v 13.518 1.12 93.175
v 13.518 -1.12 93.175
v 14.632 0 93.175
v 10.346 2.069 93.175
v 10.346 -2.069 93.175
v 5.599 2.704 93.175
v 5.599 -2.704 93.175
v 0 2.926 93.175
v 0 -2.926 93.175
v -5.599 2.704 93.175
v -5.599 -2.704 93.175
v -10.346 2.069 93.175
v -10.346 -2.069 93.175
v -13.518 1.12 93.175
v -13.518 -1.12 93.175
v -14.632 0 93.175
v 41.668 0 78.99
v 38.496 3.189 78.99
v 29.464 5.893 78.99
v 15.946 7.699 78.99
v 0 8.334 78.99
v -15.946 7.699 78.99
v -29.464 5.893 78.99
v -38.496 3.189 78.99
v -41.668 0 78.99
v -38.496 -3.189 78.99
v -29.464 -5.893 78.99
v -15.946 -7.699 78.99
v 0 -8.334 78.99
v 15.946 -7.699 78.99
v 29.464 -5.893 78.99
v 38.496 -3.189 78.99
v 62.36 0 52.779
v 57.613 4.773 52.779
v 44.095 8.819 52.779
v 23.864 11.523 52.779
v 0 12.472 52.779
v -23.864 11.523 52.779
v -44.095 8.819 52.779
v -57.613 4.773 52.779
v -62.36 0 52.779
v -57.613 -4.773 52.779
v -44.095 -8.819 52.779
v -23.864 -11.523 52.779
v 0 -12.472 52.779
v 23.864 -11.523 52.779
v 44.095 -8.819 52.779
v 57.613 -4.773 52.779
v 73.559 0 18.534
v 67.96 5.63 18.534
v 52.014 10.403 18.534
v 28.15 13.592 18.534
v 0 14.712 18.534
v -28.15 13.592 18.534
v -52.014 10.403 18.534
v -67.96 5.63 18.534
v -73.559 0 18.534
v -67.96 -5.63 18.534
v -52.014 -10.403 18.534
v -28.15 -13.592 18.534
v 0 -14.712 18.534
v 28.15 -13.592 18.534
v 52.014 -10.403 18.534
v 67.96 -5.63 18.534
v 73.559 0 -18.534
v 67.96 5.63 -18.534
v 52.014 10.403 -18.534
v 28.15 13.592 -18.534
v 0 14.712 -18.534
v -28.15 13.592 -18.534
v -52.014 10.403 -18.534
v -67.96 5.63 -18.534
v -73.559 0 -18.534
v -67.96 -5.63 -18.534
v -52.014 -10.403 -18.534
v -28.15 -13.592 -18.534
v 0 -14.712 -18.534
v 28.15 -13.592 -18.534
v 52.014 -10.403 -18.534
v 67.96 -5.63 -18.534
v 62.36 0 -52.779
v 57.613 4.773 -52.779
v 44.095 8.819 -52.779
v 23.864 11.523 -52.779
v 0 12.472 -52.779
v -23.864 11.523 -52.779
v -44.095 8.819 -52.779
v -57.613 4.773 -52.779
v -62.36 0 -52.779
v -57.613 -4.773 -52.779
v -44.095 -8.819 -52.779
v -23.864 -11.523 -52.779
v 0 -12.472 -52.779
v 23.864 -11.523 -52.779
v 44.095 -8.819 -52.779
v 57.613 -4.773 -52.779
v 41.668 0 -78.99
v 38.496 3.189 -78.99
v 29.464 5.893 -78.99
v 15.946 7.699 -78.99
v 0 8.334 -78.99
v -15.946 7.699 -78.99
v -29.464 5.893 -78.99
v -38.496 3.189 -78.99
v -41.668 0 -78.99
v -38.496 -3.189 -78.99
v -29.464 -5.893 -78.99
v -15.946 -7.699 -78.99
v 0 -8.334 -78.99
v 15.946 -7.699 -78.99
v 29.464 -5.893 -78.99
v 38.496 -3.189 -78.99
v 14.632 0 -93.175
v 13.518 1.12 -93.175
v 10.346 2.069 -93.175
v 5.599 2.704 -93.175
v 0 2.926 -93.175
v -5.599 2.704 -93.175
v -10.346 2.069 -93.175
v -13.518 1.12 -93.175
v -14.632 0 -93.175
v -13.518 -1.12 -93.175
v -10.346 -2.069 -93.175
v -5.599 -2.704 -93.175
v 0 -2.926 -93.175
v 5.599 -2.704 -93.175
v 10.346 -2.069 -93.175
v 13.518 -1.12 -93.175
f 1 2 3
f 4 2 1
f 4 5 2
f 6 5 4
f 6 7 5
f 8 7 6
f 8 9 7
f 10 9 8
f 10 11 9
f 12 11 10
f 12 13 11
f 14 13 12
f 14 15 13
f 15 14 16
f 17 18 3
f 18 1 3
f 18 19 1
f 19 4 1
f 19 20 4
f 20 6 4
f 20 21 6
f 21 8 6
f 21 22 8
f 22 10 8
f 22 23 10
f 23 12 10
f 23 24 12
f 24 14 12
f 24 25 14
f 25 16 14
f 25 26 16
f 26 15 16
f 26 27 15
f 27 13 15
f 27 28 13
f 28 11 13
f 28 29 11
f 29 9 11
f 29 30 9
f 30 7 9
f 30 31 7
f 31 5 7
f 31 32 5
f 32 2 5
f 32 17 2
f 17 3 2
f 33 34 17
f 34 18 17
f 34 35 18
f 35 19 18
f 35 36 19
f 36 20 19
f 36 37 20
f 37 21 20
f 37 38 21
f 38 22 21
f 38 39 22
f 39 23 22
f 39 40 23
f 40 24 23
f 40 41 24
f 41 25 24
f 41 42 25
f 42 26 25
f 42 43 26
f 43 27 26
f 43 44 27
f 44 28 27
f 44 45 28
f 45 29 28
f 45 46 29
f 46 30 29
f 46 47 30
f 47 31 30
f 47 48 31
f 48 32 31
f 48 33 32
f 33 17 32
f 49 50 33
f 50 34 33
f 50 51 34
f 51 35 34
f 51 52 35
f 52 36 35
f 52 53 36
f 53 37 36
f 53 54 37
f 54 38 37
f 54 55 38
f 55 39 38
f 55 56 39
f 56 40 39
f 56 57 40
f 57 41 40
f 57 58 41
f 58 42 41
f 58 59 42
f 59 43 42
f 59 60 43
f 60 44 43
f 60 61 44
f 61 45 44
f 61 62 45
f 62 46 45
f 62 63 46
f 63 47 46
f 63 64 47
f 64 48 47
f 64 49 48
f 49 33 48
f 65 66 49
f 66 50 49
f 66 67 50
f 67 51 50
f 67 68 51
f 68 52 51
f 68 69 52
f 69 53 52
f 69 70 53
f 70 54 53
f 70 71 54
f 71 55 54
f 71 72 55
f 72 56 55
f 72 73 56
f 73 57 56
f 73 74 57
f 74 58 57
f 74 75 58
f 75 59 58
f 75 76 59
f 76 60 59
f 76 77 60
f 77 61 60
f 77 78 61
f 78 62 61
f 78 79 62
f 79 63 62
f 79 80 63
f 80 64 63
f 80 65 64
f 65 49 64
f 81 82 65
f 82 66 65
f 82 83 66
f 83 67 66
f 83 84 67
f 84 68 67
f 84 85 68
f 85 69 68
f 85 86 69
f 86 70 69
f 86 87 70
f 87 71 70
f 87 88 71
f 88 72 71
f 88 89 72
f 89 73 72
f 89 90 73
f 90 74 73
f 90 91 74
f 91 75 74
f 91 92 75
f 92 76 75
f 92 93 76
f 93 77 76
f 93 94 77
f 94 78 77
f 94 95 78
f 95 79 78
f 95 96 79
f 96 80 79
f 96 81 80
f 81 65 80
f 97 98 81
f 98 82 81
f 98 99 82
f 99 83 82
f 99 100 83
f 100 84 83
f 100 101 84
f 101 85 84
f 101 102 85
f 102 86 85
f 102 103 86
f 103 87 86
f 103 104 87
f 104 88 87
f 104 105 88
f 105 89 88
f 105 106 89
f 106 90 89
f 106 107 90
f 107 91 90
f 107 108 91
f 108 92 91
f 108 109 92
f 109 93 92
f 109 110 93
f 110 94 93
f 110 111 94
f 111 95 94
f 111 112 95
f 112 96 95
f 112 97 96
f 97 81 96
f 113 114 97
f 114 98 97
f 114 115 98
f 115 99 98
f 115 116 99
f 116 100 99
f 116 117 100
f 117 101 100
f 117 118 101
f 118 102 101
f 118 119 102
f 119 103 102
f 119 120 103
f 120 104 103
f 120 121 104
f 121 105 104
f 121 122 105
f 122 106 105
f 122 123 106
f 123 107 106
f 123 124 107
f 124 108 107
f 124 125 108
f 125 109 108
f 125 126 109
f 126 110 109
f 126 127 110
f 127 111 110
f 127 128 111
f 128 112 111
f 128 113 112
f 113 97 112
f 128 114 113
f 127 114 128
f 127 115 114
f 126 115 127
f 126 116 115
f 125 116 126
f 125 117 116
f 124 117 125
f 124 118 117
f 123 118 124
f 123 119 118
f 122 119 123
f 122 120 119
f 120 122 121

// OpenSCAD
// Generated by SolidPython 1.0.1 on 2020-07-29 00:46:51


scale(v = [15, 3, 19]) {
	sphere(r = 5);
}
/***********************************************
*********      SolidPython code:      **********
************************************************
 
# import packages: SolidPython
from solid import *
from solid.utils import *
from itertools import chain, combinations, permutations


class Resize:

    def __init__(self, scad_file):
        self.scad_file = scad_file
        #self.scad_file = import_scad(scad_file)
        # cone/cylinder param:
        self.r1 = 0
        self.r2 = 0
        self.h = 0
        # rectangular prism param:
        self.w = 0
        self.l = 0
        # ellipse param:
        self.r = 0

    # import OpenScad code (file name corresponds to shape)


    # classify shape + parameters
    def assign(self, param1, param2, param3):
        if self.scad_file == 'cone.scad':
            self.r1 = param1
            self.r2 = param2
            self.h = param3
        elif self.scad_file == 'cylinder.scad':
            self.r1 = param1
            self.r2 = param2
            self.h = param3
        elif self.scad_file == 'rectangularPrism.scad':
            self.h = param1
            self.l = param2
            self.w = param3
        else:
            self.r = param1
            self.h = param2

    # resize parameters
    def iterate(self):
        x = range(3, 20, 2)
        i = 1
        if self.scad_file == 'cone.scad':
            tempList = list(permutations(x, 2))
            for temp in tempList:
                param1 = temp[0]
                param2 = temp[1]
                filepath = 'produced_scad_files/' + 'cone' + str(param1) + '_' + str(param2) + '_' + '.scad'
                scad_render_to_file(cylinder(h=param1, r1=param2, r2=0), filepath)

        elif self.scad_file == 'cylinder.scad':
            tempList = list(permutations(x, 3))
            for temp in tempList:
                param1 = temp[0]
                param2 = temp[1]
                filepath = 'produced_scad_files/' + 'cylinder' + str(param1) + '_' + str(param2) + '_' + '.scad'
                scad_render_to_file(cylinder(h=param1, r1=param2, r2=param2), filepath)

        elif self.scad_file == 'rectangularPrism.scad':
            tempList = list(permutations(x, 3))
            for temp in tempList:
                param1 = temp[0]
                param2 = temp[1]
                param3 = temp[2]
                filepath = 'produced_scad_files/' + 'rectangularPrism' + str(param1) + '_' + str(param2) + '_' + str(
                    param3) + '.scad'
                scad_render_to_file(cube(size=(param1, param2, param3)), filepath)

        elif self.scad_file == 'ellipse.scad':
            tempList = list(permutations(x, 4))
            for temp in tempList:
                param1 = temp[0]
                param2 = temp[1]
                param3 = temp[2]
                param4 = temp[3]
                filepath = 'produced_scad_files/' + 'ellipse' + str(param1) + '_' + str(param2) + '_' + str(param3) + '_' + str(param4) + '.scad'
                scad_render_to_file(scale([param1, param2, param3])(sphere(r=param4)), filepath)

    def render_to_scadfile(self):
        scad_render_to_file(scad, 'example.scad') 
 
************************************************/
